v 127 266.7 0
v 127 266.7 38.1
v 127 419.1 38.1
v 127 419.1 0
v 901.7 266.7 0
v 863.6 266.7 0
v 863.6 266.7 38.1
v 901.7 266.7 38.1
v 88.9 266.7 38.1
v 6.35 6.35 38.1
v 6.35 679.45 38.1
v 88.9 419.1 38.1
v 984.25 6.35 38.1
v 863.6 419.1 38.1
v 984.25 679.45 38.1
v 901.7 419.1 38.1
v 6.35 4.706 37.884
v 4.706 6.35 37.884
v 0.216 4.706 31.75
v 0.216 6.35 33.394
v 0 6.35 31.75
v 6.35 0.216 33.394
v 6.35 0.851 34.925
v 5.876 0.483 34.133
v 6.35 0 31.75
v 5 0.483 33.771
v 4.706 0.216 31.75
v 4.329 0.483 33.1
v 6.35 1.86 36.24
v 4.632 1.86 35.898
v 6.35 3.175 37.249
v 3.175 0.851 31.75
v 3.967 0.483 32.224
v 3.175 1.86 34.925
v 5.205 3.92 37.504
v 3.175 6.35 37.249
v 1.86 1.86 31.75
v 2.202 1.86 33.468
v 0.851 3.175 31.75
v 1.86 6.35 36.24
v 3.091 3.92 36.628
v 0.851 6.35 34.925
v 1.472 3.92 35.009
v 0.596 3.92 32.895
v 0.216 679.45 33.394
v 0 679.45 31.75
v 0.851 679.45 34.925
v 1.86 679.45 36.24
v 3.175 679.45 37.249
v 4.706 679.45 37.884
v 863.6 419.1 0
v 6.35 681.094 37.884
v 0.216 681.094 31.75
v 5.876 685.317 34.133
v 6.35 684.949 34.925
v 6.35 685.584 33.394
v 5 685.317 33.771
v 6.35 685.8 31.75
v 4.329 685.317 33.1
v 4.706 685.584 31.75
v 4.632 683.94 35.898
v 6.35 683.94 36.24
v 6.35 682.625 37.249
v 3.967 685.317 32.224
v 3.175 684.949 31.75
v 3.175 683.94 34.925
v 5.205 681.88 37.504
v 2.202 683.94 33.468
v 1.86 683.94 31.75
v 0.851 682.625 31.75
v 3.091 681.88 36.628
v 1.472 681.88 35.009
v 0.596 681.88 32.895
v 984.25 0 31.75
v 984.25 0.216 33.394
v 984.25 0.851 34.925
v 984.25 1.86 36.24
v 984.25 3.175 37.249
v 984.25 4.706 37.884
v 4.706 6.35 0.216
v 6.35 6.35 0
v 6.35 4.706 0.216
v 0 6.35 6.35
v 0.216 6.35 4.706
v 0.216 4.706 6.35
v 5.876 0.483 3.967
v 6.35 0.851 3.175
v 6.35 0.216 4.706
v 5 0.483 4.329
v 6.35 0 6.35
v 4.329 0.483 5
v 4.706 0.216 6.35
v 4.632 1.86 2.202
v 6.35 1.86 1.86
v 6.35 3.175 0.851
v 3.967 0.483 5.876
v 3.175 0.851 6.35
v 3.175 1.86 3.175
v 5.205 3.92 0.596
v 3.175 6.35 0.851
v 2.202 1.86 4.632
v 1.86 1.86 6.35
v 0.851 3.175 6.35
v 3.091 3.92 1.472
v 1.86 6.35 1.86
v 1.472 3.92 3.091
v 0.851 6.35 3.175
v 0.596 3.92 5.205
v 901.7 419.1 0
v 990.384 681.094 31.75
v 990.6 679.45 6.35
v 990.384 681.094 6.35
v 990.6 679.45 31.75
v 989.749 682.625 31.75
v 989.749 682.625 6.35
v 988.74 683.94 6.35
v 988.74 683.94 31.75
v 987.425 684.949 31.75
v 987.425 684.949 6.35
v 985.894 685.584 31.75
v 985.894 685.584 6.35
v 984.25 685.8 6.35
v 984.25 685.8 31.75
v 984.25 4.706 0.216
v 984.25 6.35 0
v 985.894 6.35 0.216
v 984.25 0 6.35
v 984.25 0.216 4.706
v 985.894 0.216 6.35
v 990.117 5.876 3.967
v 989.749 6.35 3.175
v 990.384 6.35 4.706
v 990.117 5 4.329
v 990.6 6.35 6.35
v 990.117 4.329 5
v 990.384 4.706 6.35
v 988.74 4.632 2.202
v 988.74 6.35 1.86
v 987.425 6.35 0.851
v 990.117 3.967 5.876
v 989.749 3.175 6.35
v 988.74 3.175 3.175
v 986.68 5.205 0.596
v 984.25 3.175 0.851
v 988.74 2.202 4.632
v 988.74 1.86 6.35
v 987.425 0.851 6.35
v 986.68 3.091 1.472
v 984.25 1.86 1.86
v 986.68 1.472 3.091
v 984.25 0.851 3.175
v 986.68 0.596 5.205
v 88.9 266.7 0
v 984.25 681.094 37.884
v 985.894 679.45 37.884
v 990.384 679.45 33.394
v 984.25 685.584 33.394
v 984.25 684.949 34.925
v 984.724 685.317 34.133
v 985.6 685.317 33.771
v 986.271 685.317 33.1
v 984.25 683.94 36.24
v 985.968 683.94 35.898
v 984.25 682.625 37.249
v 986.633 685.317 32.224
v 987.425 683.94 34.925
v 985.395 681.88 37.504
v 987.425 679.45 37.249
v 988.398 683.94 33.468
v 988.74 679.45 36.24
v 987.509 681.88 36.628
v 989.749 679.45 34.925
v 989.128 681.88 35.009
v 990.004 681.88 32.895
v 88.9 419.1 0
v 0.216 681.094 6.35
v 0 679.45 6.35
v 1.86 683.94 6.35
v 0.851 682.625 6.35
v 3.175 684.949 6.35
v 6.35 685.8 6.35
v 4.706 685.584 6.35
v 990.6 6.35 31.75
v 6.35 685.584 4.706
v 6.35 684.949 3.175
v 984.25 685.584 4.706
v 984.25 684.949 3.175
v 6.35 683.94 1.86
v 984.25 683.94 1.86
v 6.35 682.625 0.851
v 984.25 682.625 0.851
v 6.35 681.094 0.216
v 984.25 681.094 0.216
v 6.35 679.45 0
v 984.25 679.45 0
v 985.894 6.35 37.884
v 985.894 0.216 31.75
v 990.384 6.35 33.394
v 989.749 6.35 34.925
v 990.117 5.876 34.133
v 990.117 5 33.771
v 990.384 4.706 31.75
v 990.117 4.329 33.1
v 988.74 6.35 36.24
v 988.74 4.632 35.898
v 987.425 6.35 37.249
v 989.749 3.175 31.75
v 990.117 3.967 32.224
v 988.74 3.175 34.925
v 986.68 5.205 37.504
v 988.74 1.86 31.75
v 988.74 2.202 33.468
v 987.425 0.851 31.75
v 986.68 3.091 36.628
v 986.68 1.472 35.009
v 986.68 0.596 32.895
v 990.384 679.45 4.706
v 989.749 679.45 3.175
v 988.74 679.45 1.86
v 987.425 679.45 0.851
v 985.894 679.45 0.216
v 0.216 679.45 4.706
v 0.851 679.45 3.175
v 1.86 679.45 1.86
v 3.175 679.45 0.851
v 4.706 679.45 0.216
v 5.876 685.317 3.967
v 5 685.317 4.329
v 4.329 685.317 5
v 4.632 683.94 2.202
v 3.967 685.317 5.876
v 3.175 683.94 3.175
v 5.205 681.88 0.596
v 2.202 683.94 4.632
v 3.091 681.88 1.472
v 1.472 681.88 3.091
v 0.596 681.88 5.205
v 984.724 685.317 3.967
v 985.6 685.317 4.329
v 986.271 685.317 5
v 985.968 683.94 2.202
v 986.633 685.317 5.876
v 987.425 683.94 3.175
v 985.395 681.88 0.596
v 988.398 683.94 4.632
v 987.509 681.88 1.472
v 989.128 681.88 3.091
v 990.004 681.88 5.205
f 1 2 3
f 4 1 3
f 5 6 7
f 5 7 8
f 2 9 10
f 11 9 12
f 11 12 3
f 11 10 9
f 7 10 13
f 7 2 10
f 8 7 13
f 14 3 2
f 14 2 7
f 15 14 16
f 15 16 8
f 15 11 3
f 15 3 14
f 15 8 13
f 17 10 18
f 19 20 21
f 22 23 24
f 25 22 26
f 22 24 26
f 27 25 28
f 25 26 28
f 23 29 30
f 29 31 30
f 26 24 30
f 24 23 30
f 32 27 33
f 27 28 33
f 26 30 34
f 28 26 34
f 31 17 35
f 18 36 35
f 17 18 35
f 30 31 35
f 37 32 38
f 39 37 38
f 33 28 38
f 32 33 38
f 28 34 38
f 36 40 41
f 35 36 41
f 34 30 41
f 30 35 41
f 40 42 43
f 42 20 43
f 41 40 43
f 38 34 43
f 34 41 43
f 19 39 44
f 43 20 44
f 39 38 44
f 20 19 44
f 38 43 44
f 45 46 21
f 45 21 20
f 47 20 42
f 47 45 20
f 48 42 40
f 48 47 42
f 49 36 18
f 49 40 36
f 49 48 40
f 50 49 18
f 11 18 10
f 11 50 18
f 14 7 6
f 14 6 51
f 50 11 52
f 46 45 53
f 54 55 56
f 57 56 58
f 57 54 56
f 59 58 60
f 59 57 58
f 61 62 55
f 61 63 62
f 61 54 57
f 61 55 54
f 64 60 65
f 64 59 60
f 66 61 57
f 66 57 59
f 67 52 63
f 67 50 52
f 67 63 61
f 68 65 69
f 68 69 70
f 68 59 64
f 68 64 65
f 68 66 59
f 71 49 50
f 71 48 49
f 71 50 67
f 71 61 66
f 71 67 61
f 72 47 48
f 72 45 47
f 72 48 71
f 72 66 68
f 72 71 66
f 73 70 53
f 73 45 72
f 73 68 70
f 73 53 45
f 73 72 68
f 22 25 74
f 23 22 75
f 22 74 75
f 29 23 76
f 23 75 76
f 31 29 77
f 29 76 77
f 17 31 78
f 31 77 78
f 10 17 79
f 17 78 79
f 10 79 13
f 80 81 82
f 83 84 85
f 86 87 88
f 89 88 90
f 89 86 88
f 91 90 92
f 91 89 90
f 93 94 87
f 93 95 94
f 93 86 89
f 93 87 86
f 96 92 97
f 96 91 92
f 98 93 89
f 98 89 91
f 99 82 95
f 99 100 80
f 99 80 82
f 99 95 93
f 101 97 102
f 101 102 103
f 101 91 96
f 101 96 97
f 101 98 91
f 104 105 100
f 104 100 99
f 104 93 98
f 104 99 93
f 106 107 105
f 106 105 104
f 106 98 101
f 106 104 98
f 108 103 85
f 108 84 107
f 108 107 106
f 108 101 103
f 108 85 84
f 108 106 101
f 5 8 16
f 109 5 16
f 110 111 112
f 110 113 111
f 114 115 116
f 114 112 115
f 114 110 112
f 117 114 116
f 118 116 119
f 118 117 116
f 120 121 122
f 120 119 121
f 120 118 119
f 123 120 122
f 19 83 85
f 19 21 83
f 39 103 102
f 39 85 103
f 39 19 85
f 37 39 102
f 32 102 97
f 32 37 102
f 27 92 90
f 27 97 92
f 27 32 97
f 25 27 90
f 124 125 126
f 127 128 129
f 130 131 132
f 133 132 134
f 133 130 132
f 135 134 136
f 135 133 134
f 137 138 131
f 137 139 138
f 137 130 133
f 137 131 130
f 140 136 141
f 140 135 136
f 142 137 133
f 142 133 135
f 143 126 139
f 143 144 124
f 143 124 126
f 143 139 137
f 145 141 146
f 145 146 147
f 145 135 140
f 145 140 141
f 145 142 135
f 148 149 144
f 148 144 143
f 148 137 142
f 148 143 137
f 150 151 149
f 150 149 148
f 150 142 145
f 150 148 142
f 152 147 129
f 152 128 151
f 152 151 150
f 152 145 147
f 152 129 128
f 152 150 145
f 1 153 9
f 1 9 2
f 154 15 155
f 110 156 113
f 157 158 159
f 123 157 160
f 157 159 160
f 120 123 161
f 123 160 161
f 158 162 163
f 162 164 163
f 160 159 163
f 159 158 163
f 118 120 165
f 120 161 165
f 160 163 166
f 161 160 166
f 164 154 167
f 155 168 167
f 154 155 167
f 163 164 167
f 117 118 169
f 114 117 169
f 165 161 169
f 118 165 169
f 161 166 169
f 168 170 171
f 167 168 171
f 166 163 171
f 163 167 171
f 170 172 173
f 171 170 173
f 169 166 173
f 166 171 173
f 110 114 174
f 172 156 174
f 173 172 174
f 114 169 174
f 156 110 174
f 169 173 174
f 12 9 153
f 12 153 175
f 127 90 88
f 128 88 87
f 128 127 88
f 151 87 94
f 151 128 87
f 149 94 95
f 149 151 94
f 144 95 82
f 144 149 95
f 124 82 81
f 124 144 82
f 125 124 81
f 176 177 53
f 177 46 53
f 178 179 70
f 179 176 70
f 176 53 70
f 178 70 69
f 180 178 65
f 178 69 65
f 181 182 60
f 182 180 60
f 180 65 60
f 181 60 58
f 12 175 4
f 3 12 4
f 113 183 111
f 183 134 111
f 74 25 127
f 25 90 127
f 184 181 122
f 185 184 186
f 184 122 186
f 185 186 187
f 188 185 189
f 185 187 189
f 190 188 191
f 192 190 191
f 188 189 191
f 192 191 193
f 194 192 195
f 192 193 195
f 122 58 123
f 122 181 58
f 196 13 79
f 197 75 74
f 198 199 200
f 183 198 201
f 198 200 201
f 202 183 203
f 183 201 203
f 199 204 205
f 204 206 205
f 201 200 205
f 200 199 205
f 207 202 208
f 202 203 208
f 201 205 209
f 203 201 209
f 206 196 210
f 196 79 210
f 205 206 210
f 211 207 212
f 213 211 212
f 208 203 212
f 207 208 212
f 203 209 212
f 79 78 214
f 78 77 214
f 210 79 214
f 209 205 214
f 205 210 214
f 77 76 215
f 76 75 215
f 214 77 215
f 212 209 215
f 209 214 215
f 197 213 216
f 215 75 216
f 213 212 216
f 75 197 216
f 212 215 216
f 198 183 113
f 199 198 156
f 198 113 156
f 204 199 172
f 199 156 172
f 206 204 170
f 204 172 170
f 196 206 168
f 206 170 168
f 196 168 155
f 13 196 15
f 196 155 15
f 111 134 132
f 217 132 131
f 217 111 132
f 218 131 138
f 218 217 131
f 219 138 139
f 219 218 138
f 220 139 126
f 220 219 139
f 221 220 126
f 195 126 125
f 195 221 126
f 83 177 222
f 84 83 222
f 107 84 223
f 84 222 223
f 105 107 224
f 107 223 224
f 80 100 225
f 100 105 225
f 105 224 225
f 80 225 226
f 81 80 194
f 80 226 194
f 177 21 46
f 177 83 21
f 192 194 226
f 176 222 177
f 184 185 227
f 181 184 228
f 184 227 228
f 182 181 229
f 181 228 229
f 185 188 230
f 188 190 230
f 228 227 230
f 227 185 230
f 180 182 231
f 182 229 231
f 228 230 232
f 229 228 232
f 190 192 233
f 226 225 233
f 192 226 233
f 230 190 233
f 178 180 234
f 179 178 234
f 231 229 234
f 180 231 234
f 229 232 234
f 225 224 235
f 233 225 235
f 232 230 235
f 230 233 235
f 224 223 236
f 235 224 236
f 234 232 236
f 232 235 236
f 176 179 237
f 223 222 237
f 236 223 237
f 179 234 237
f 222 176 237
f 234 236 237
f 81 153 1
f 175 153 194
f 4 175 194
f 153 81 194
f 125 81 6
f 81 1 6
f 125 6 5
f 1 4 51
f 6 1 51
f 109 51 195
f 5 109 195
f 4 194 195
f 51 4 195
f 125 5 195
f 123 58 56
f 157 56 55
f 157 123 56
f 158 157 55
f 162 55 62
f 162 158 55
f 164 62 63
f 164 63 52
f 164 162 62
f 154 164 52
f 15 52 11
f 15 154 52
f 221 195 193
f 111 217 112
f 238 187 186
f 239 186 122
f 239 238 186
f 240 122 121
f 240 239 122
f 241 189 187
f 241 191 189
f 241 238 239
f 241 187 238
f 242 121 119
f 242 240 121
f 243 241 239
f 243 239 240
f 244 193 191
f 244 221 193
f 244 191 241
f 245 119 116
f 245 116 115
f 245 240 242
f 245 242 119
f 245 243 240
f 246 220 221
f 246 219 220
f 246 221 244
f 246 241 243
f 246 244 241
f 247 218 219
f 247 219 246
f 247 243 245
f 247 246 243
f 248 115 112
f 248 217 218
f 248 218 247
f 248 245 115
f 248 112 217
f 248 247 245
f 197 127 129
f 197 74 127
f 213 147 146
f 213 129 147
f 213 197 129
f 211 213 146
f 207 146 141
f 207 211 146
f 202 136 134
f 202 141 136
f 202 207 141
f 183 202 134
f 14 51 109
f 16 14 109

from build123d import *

# Parameters (mm, degrees)
F0_W     = 990.6
F0_H     = 685.8
F1_DEPTH = 38.1
F2_R     = 6.35
F3_W     = 38.1
F3_H     = 152.4
F4_DEPTH = 38.1


with BuildPart() as f1:
    # F0 (on Top) → F1 (new body)
    with BuildSketch(Plane.XY):
        with Locations((495.3, 342.9)):
            Rectangle(F0_W, F0_H)
    extrude(amount=F1_DEPTH)

    # F2
    f2_edges = [f1.edges().sort_by_distance(p)[0] for p in [
        (0, 342.9, 38.1),
        (495.3, 0, 38.1),
        (990.6, 342.9, 38.1),
        (495.3, 685.8, 38.1),
        (0, 342.9, 0),
        (495.3, 0, 0),
        (990.6, 342.9, 0),
        (495.3, 685.8, 0),
        (0, 0, 19.05),
        (990.6, 0, 19.05),
        (990.6, 685.8, 19.05),
        (0, 685.8, 19.05),
    ]]
    fillet(f2_edges, radius=F2_R)

    # F3 (on face) → F4 (cut, through all)
    with BuildSketch(Plane.XY.offset(38.1)):
        with Locations((107.95, 342.9)):
            Rectangle(F3_W, F3_H)
        with Locations((882.65, 342.9)):
            Rectangle(F3_W, F3_H)
    extrude(amount=-F4_DEPTH, mode=Mode.SUBTRACT)


solid = f1.part
